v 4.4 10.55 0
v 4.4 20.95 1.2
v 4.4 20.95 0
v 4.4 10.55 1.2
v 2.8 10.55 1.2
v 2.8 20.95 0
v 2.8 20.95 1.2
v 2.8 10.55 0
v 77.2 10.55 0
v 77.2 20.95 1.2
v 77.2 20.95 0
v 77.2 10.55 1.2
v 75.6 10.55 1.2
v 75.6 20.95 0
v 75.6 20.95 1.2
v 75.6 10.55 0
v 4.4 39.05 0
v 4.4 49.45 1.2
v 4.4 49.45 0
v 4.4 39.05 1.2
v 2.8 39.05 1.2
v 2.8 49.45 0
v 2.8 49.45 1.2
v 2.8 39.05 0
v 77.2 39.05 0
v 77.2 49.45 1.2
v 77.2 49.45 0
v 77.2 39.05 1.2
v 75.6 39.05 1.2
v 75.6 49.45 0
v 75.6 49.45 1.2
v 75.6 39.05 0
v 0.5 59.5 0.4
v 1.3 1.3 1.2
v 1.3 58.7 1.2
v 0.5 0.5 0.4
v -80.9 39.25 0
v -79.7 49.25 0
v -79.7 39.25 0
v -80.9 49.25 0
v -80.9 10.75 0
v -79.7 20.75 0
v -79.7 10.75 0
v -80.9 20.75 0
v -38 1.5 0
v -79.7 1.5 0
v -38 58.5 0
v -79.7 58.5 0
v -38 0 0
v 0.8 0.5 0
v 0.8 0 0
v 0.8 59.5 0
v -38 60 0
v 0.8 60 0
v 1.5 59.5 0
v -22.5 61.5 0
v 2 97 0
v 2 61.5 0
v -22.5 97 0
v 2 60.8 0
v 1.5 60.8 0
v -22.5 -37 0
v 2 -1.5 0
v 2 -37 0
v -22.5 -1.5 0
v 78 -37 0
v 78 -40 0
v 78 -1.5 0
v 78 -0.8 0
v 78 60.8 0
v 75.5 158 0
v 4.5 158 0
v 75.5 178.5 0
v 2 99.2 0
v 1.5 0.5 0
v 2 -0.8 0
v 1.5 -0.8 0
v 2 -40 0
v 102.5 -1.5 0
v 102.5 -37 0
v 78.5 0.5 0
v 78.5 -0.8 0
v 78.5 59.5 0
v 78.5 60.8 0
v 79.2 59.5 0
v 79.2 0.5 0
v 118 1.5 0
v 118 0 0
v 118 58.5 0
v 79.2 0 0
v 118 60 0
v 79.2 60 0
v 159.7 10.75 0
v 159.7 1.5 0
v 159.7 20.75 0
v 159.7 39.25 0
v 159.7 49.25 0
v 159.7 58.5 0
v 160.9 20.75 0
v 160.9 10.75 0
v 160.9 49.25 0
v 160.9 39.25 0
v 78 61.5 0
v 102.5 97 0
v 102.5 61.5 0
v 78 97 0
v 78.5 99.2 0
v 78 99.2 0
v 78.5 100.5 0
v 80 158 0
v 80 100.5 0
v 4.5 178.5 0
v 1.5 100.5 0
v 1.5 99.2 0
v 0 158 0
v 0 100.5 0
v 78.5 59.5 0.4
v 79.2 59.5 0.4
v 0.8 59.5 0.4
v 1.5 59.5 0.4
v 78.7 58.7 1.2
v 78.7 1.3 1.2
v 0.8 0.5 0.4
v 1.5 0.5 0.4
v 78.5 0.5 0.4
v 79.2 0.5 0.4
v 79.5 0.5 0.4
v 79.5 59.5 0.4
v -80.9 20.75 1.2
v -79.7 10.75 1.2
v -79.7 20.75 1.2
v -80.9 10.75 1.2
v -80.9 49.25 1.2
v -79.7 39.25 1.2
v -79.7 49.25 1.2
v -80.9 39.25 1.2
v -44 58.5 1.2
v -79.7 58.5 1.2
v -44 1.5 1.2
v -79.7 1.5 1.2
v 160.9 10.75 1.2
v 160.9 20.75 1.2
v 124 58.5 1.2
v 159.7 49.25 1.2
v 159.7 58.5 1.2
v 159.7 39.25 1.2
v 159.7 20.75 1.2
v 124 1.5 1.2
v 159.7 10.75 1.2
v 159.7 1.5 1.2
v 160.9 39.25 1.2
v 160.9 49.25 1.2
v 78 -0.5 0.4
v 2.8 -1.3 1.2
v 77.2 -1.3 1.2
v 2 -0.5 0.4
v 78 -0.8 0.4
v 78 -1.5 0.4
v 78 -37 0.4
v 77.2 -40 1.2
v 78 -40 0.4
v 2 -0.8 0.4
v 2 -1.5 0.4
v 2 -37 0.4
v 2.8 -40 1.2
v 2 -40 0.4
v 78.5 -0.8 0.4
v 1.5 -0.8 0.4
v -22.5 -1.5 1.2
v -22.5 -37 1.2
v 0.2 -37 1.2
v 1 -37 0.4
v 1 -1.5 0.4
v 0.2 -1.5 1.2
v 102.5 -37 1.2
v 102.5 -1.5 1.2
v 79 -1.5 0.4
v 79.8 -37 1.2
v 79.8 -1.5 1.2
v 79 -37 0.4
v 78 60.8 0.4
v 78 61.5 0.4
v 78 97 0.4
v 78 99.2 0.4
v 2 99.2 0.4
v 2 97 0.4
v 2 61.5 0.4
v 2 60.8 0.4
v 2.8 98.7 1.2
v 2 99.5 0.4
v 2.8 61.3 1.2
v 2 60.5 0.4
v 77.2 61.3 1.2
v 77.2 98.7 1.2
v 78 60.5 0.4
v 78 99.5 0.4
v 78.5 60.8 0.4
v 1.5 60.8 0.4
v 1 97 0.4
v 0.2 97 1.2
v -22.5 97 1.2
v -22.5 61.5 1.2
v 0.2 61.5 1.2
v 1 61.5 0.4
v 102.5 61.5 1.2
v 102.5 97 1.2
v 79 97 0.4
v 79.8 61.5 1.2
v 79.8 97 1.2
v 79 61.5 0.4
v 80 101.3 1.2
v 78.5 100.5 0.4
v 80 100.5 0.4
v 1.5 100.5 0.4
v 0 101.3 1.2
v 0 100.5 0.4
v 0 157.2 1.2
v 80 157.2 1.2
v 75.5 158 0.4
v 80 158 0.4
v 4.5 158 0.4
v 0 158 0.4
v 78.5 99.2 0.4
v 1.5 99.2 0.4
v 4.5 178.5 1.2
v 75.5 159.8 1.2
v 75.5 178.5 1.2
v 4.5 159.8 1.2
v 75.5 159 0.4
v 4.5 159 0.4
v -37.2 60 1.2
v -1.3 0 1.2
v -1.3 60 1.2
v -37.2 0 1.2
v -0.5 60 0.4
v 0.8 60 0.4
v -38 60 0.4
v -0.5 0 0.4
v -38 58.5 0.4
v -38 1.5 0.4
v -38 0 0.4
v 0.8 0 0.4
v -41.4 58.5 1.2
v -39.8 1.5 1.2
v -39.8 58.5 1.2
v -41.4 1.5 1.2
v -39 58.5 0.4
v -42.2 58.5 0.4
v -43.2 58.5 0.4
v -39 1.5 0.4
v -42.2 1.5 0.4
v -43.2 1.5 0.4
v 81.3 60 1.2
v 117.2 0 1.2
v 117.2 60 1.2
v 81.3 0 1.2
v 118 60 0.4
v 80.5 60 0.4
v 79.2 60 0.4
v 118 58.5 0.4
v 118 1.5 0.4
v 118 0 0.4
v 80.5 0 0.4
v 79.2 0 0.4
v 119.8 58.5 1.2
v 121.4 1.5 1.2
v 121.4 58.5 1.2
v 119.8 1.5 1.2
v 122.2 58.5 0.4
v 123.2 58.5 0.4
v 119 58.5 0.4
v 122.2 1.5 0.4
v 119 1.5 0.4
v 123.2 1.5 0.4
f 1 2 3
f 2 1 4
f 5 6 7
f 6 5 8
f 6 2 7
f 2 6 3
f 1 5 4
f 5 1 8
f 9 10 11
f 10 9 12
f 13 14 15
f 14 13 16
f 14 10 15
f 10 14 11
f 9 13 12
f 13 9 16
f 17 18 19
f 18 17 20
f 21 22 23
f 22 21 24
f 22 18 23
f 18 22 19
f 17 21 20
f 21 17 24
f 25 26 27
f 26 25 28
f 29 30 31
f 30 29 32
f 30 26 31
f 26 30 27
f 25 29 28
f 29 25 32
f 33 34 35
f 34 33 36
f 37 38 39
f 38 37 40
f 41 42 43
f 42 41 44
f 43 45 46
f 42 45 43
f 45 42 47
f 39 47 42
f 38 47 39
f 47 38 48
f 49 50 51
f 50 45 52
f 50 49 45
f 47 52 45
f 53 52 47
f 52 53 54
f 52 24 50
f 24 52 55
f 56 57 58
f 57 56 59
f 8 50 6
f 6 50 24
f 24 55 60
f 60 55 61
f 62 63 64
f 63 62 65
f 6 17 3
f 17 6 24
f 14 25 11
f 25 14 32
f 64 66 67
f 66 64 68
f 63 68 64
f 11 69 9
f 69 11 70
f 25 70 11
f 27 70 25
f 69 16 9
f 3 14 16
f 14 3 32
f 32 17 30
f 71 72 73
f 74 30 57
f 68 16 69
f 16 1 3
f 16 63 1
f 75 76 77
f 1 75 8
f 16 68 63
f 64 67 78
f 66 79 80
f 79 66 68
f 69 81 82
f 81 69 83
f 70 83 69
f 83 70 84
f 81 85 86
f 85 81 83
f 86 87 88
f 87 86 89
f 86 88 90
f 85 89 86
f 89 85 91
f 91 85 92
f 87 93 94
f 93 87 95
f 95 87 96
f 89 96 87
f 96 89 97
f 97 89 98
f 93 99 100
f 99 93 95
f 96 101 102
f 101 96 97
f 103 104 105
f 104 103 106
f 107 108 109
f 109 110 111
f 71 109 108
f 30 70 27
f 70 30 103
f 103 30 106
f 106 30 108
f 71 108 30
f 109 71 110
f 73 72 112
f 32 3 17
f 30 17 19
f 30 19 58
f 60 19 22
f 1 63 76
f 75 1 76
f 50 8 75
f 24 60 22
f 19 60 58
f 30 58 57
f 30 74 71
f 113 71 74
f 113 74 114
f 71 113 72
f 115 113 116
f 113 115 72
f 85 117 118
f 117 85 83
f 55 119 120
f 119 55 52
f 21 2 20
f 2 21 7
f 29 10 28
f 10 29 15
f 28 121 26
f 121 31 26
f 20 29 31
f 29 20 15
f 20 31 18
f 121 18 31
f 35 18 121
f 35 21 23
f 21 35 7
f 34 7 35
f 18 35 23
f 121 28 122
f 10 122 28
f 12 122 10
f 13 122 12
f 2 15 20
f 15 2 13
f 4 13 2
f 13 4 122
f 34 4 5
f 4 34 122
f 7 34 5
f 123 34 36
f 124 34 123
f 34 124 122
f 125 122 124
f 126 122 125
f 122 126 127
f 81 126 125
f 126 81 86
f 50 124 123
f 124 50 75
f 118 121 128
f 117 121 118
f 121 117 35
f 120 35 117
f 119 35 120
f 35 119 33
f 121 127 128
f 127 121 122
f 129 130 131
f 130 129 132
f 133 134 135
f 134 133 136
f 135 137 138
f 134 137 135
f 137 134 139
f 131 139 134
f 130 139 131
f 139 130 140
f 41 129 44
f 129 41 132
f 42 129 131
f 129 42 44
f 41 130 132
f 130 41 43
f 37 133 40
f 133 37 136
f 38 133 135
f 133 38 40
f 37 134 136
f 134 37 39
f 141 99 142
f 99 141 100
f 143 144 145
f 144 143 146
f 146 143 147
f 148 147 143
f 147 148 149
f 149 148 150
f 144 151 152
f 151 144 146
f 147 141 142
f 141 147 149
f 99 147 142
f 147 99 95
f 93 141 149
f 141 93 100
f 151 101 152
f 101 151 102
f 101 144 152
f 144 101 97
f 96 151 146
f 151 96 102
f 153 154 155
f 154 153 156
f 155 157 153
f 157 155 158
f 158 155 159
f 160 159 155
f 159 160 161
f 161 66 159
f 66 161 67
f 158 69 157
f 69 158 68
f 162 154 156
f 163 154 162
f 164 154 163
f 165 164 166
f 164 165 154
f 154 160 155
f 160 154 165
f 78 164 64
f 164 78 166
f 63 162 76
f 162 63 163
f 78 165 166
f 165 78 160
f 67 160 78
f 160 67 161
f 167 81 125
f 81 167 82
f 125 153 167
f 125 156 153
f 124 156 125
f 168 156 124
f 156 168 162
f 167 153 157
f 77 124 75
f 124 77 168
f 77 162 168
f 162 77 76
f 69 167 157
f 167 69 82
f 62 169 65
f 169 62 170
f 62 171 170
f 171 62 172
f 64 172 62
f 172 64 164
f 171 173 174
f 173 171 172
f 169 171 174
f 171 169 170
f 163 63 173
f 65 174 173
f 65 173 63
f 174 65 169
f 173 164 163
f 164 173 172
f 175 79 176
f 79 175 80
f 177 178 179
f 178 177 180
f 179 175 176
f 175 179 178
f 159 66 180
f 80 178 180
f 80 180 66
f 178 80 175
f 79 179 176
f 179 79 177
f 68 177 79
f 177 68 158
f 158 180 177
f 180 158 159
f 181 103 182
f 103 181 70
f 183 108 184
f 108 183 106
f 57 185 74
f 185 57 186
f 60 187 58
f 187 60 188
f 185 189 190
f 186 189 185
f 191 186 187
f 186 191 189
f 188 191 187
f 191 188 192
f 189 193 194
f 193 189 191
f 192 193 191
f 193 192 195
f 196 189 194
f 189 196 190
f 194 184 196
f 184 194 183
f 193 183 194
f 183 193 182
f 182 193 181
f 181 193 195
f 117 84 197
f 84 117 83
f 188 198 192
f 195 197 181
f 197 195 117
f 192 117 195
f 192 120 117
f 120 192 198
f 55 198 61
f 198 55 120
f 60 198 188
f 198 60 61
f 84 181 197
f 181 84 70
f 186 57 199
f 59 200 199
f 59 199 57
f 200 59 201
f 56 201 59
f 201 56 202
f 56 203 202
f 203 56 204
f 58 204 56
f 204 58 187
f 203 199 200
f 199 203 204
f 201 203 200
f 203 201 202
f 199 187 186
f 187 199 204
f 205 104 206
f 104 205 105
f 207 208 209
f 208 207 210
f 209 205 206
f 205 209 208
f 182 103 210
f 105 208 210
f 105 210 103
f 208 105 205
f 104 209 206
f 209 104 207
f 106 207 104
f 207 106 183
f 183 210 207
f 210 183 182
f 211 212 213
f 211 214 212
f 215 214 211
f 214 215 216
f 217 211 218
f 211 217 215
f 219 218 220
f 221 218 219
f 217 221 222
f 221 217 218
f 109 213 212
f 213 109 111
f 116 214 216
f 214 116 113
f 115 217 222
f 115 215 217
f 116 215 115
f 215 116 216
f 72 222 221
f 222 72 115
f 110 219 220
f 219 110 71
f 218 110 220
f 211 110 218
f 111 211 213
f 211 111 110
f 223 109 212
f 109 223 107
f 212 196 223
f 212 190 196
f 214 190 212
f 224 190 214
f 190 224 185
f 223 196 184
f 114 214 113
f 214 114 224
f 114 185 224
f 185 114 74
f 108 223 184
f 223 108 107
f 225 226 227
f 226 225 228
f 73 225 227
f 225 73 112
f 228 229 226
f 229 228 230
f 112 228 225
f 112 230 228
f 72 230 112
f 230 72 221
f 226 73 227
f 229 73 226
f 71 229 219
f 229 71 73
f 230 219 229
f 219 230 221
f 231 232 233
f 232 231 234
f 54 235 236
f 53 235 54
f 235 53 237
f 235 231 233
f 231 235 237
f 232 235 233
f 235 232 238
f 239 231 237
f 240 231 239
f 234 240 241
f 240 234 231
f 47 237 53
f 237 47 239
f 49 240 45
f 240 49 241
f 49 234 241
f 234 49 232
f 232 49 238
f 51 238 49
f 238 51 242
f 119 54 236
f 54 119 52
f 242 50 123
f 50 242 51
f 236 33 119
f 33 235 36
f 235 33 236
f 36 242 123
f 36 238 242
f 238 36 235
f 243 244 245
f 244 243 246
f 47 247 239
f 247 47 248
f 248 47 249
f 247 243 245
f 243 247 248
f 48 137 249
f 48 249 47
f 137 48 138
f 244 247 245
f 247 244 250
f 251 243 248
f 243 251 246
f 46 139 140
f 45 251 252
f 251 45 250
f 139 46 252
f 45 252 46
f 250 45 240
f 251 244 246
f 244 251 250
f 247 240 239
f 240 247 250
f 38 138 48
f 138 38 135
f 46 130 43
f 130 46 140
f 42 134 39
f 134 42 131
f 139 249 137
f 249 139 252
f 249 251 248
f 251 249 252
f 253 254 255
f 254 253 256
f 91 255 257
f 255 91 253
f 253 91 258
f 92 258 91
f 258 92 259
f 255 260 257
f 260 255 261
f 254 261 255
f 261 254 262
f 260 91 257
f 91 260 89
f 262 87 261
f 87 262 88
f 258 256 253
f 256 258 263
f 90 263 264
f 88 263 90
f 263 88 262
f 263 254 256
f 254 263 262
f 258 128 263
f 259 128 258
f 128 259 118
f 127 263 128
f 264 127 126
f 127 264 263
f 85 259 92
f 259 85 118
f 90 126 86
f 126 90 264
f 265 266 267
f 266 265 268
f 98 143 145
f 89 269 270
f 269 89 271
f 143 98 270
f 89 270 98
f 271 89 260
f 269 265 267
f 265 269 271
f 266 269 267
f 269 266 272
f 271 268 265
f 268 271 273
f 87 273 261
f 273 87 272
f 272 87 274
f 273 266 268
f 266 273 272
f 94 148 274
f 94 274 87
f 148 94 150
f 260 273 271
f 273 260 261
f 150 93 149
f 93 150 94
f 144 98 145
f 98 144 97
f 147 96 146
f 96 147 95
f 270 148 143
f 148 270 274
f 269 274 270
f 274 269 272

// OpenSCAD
// ── CAIXA DOBRÁVEL (impressa plana, dobradiças finas) ──
// Uma peça só, plana: base, frente, trás, laterais duplas, tampa. Imprime com a face de baixo
// na mesa (fica por FORA da caixa). Entre painéis há um V (chanfros a 45°) e, no fundo, uma tira
// fina (a dobradiça, `dobradica` mm) que dobra 90°. Fecha sem cola:
//   1. dobra a frente e a trás para cima e as abas delas para dentro;
//   2. dobra as laterais para cima, o lombo por cima e a parte de dentro (SI) para baixo, por
//      dentro das abas: as patilhas da SI entram nas ranhuras da base e prendem tudo;
//   3. fecha a tampa e mete a aba de fecho por dentro da frente.
// Melhor em PETG (ou PP/TPU); em PLA a dobradiça aguenta poucas aberturas.
// A mesma planificação está em Maker_Pro_Frontend_Prod/lib/caixaDobravel.ts (pré-visualização).
//
// Parâmetros (mm): largura, profundidade, altura (medidas por fora, fechada), espessura (painéis),
//   dobradica (espessura da tira)

function _n(v, d, a, b) = is_undef(v) ? d : max(a, min(b, v));

// Tudo dentro do módulo: os parâmetros do servidor são acrescentados no fim do ficheiro e só
// existem quando o módulo é chamado (as variáveis de topo seriam calculadas antes).
module caixa() {
    L = is_undef(largura) ? 80 : _n(largura, 80, 30, 220);
    P = is_undef(profundidade) ? 60 : _n(profundidade, 60, 30, 220);
    A = is_undef(altura) ? 40 : _n(altura, 40, 15, 150);
    t = is_undef(espessura) ? 1.2 : _n(espessura, 1.2, 0.8, 2.4);
    h = is_undef(dobradica) ? 0.4 : _n(dobradica, 0.4, 0.2, 0.8);
    c = 0.3;                         // folga entre camadas
    g = 1.0;                         // largura da tira da dobradiça
    aS = A - t - c;                  // altura da lateral (fica abaixo da tampa)
    lombo = 3 * t + 2 * c;           // lateral + aba + SI
    lSI = aS - t - c;                // SI: da esquina do lombo até à base
    df = min(P * 0.4, 25);           // abas da frente/trás
    tf = min(A * 0.5, 22);           // aba de fecho
    prof = P - t - c;                // tampa
    xIn = t + c;                     // frente/trás entre as laterais
    z0 = t + c; z1 = aS - t - c;     // altura útil das abas
    yT = P + A;
    mTf = 3 * t + 3 * c;
    yIn0 = t + c; yIn1 = P - t - c; comp = yIn1 - yIn0;
    wPat = min(10, comp / 4);
    patY = [yIn0 + comp * 0.25, yIn0 + comp * 0.75];
    s0 = 2 * t + 2 * c - 0.2; s1 = 3 * t + 2 * c + 0.2;
    d0 = aS + lombo; d1 = d0 + lSI;

    // painel [x0,y0,x1,y1] com chanfro (V) nos lados marcados [y0, x1, y1, x0]
    module painel(r, ch) {
        e = 0.01;
        function ins(k, v) = ch[k] ? v : 0;
        b = g / 2;  s = g / 2 + (t - h);
        hull() {
            translate([r[0] + ins(3, b), r[1] + ins(0, b), 0])
                cube([r[2] - r[0] - ins(3, b) - ins(1, b), r[3] - r[1] - ins(0, b) - ins(2, b), h]);
            translate([r[0] + ins(3, s), r[1] + ins(0, s), t - e])
                cube([r[2] - r[0] - ins(3, s) - ins(1, s), r[3] - r[1] - ins(0, s) - ins(2, s), e]);
        }
    }
    // tira da dobradiça sobre o segmento (horizontal ou vertical) [x0,y0,x1,y1]
    module tira(q) {
        w = g / 2 + 0.3;
        if (q[1] == q[3]) translate([q[0], q[1] - w, 0]) cube([q[2] - q[0], 2 * w, h]);
        else translate([q[0] - w, q[1], 0]) cube([2 * w, q[3] - q[1], h]);
    }
    module bloco(r) { translate([r[0], r[1], 0]) cube([r[2] - r[0], r[3] - r[1], t]); }

    // base com as ranhuras das patilhas
    difference() {
        painel([0, 0, L, P], [1, 1, 1, 1]);
        for (yc = patY) {
            translate([s0, yc - wPat / 2 - 0.2, -1]) cube([s1 - s0, wPat + 0.4, t + 2]);
            translate([L - s1, yc - wPat / 2 - 0.2, -1]) cube([s1 - s0, wPat + 0.4, t + 2]);
        }
    }
    // frente, trás e abas
    painel([xIn, -A, L - xIn, 0], [0, 1, 1, 1]);              tira([xIn, 0, L - xIn, 0]);
    painel([xIn - df, -z1, xIn, -z0], [0, 1, 0, 0]);          tira([xIn, -z1, xIn, -z0]);
    painel([L - xIn, -z1, L - xIn + df, -z0], [0, 0, 0, 1]);  tira([L - xIn, -z1, L - xIn, -z0]);
    painel([xIn, P, L - xIn, P + A], [1, 1, 1, 1]);           tira([xIn, P, L - xIn, P]);
    painel([xIn - df, P + z0, xIn, P + z1], [0, 1, 0, 0]);    tira([xIn, P + z0, xIn, P + z1]);
    painel([L - xIn, P + z0, L - xIn + df, P + z1], [0, 0, 0, 1]); tira([L - xIn, P + z0, L - xIn, P + z1]);
    // tampa e aba de fecho
    painel([0, yT, L, yT + prof], [1, 0, 1, 0]);              tira([xIn, yT, L - xIn, yT]);
    painel([mTf, yT + prof, L - mTf, yT + prof + tf], [1, 0, 0, 0]); tira([mTf, yT + prof, L - mTf, yT + prof]);
    // laterais duplas (esquerda e direita)
    painel([-aS, 0, 0, P], [0, 1, 0, 1]);                     tira([0, 0, 0, P]);
    painel([-(aS + lombo), yIn0, -aS, yIn1], [0, 1, 0, 1]);   tira([-aS, yIn0, -aS, yIn1]);
    painel([-d1, yIn0, -d0, yIn1], [0, 1, 0, 0]);             tira([-d0, yIn0, -d0, yIn1]);
    for (yc = patY) bloco([-(d1 + t), yc - wPat / 2, -d1 + 0.01, yc + wPat / 2]);
    painel([L, 0, L + aS, P], [0, 1, 0, 1]);                  tira([L, 0, L, P]);
    painel([L + aS, yIn0, L + aS + lombo, yIn1], [0, 1, 0, 1]); tira([L + aS, yIn0, L + aS, yIn1]);
    painel([L + d0, yIn0, L + d1, yIn1], [0, 0, 0, 1]);       tira([L + d0, yIn0, L + d0, yIn1]);
    for (yc = patY) bloco([L + d1 - 0.01, yc - wPat / 2, L + d1 + t, yc + wPat / 2]);
}

caixa();
